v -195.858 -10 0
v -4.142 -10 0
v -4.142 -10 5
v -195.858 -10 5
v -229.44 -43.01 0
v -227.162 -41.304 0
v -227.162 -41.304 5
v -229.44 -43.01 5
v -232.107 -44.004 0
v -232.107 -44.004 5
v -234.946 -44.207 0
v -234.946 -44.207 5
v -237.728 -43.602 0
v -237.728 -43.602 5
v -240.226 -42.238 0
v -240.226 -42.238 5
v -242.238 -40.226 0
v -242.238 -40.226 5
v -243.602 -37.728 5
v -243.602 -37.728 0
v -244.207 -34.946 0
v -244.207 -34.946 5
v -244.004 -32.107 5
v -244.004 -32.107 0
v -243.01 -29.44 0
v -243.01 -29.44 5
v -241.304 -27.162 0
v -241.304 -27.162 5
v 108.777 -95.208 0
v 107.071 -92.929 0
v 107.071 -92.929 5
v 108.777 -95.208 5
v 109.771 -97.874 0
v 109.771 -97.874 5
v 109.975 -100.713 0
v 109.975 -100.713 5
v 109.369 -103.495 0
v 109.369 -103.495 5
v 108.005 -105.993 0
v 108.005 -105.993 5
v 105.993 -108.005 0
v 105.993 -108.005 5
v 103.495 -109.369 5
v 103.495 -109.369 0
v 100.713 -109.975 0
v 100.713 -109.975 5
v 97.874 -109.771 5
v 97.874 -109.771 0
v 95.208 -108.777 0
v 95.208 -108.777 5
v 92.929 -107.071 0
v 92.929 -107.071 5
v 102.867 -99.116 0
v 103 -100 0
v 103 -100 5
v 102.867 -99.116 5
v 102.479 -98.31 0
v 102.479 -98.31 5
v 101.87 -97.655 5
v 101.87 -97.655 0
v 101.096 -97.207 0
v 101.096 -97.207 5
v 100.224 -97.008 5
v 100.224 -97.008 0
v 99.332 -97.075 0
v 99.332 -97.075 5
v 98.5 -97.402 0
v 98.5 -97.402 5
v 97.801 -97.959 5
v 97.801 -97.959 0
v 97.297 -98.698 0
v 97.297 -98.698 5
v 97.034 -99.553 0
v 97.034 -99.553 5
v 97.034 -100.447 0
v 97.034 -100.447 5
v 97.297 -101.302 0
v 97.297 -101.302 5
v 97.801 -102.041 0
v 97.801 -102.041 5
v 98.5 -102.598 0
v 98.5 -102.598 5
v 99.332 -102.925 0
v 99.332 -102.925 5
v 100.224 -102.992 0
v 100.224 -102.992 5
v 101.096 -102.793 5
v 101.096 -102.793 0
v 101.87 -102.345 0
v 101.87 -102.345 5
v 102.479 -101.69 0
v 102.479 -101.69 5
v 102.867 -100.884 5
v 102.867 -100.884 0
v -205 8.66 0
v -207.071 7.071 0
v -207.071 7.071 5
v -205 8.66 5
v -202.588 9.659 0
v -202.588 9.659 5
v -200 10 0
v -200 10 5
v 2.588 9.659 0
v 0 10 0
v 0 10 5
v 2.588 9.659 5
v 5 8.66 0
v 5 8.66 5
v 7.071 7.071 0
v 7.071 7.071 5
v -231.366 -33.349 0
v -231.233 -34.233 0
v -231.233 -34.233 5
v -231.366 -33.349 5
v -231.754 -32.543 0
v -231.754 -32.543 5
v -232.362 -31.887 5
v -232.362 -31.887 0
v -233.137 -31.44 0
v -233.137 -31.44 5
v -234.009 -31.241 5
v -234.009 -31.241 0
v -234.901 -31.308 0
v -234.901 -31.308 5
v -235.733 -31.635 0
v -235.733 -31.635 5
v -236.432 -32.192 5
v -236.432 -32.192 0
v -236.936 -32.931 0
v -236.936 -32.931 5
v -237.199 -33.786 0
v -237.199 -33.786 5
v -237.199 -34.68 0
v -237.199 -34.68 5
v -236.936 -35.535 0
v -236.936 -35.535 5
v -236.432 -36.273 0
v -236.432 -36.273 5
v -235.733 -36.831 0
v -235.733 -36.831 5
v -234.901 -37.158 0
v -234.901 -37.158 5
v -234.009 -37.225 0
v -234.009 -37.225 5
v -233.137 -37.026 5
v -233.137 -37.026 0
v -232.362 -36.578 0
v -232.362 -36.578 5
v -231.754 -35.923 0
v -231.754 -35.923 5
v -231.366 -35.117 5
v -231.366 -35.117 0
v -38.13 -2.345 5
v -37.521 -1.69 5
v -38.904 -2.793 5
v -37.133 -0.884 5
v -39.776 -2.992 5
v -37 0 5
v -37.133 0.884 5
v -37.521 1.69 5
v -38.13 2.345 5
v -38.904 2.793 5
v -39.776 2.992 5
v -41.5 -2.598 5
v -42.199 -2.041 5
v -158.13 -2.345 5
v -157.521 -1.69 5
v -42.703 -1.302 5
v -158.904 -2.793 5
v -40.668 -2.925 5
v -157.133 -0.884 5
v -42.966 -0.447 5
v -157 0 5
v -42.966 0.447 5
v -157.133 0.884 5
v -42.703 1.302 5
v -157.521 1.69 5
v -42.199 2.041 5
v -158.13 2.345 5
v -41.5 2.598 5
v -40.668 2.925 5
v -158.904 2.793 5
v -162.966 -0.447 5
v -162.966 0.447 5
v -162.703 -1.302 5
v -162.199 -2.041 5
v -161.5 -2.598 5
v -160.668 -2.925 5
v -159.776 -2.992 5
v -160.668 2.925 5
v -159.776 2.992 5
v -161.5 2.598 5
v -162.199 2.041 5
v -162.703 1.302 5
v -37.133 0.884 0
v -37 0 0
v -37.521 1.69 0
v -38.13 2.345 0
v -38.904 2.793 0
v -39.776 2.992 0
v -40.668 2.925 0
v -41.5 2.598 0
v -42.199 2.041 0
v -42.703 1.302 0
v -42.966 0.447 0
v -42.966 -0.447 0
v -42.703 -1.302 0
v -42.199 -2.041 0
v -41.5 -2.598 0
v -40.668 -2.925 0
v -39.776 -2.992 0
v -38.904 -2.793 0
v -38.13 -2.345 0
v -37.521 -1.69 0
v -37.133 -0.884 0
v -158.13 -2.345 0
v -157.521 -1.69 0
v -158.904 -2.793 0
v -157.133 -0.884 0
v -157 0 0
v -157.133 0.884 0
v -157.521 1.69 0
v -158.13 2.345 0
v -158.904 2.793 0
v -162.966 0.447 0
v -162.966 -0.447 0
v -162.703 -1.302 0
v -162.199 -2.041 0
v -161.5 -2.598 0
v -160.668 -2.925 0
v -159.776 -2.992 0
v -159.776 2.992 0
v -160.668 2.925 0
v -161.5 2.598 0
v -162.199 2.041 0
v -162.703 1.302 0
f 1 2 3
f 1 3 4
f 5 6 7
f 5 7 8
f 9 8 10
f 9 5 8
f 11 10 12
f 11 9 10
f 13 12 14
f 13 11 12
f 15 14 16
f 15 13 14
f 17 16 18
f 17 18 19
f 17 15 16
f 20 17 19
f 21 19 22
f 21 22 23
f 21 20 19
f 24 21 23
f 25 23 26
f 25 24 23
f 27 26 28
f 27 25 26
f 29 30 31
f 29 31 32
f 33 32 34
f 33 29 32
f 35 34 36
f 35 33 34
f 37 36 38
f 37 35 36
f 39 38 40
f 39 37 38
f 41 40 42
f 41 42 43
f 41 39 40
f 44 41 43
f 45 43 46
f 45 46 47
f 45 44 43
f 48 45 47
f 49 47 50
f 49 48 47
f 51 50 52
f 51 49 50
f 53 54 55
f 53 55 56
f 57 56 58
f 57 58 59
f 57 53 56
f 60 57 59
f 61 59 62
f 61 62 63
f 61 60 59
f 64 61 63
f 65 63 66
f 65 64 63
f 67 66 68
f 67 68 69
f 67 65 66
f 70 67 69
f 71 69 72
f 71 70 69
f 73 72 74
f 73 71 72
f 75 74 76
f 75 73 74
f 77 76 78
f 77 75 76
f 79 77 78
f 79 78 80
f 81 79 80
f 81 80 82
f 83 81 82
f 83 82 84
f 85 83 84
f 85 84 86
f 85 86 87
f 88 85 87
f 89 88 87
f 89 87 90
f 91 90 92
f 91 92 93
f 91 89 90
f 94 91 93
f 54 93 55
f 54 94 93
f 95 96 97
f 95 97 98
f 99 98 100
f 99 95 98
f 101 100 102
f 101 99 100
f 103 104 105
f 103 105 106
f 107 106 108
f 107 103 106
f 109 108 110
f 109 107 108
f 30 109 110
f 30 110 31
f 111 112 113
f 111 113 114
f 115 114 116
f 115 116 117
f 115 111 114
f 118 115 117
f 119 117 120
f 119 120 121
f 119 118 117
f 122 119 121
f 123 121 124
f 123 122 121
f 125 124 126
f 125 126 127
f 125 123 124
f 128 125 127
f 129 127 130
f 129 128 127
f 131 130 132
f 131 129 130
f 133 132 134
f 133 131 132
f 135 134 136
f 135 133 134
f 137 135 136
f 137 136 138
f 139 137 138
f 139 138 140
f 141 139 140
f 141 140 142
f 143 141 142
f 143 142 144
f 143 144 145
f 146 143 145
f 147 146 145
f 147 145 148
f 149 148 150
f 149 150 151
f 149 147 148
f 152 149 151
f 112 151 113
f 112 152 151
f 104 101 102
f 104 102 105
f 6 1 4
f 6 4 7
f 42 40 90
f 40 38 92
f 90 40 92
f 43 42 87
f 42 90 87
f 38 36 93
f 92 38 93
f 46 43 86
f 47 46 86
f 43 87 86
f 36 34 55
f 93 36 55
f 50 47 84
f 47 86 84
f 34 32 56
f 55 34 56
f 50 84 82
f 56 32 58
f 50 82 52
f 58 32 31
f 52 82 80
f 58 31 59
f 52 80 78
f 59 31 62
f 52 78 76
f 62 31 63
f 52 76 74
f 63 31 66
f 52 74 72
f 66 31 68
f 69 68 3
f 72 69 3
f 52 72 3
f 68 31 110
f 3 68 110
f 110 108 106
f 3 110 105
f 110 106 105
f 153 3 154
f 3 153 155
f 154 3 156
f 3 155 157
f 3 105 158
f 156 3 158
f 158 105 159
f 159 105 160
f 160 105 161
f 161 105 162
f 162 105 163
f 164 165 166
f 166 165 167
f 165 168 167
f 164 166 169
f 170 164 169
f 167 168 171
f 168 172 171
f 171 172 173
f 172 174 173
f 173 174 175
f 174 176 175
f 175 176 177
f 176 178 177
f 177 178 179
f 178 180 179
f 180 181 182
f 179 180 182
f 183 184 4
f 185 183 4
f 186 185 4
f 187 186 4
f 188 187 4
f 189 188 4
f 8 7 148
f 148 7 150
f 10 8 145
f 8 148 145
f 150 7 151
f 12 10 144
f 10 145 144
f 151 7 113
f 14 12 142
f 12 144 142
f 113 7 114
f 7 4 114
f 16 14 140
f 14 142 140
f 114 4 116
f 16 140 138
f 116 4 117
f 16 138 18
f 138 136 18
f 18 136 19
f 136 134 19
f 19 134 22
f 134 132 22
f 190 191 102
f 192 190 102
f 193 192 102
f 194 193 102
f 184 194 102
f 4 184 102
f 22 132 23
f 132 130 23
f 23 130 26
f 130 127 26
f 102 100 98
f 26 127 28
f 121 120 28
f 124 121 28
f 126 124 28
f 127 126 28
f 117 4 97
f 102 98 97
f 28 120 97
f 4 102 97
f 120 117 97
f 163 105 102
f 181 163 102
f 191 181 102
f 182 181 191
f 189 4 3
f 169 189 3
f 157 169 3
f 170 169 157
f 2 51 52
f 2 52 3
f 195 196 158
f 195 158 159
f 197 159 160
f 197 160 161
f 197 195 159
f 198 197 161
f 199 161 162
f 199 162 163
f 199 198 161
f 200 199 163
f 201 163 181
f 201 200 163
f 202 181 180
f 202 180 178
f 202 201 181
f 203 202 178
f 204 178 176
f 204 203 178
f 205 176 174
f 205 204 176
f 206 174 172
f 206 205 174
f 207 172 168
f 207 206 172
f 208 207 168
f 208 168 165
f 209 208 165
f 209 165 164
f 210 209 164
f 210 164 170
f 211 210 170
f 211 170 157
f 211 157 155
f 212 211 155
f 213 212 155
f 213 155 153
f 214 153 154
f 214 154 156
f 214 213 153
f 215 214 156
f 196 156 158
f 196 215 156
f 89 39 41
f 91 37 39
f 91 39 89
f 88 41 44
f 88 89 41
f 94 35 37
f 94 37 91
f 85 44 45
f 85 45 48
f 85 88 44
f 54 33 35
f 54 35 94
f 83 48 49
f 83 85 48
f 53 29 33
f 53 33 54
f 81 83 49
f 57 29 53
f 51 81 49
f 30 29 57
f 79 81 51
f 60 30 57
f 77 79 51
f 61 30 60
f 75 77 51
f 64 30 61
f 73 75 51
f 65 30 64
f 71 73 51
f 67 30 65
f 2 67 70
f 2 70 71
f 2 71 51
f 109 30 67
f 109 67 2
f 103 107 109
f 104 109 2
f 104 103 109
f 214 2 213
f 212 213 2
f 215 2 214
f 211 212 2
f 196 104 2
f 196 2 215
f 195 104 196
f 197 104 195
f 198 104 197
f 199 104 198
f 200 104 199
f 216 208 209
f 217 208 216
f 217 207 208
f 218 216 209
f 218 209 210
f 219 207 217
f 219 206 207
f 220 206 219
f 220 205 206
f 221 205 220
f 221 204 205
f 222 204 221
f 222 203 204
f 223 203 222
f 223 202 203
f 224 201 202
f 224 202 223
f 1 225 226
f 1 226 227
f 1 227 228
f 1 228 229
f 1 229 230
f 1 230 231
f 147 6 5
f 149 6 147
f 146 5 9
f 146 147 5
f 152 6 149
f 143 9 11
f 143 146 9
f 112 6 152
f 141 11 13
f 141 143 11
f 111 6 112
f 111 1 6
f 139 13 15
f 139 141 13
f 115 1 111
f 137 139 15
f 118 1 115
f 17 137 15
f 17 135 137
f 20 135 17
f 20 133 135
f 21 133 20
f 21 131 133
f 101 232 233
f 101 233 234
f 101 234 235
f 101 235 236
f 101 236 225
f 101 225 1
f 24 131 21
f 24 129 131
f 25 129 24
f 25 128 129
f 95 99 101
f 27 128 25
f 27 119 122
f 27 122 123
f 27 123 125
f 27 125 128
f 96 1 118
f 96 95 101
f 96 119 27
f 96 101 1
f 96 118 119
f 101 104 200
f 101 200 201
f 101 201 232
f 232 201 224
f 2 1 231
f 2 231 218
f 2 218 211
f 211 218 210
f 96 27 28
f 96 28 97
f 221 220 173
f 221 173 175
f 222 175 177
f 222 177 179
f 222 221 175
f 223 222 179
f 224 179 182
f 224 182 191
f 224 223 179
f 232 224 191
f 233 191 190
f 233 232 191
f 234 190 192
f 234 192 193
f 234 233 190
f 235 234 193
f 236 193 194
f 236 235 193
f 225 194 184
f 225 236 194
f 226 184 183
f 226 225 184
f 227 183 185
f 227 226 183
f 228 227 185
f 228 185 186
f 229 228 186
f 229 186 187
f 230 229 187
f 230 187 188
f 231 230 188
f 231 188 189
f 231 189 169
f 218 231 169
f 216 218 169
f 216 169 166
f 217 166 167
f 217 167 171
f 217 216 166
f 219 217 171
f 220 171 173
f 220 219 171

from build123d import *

# Parameters (mm, degrees)
SKETCH1_R           = 3
BOSS_EXTRUDE2_DEPTH = 5


with BuildPart() as part:
    # Sketch1 → Boss-Extrude2 (new body)
    with BuildSketch(Plane.XY):
        with BuildLine():
            Line((-195.857864376, -10), (-227.161878591, -41.304014214))
            ThreePointArc((-227.161878591, -41.304014214), (-241.304014214, -41.304014214), (-241.304014214, -27.161878591))
            Line((-241.304014214, -27.161878591), (-207.071067812, 7.071067812))
            ThreePointArc((-207.071067812, 7.071067812), (-203.826834324, 9.238795325), (-200, 10))
            Line((-200, 10), (0, 10))
            ThreePointArc((0, 10), (3.826834324, 9.238795325), (7.071067812, 7.071067812))
            Line((7.071067812, 7.071067812), (107.071067812, -92.928932188))
            ThreePointArc((107.071067812, -92.928932188), (107.071067812, -107.071067812), (92.928932188, -107.071067812))
            Line((92.928932188, -107.071067812), (-4.142135624, -10))
            Line((-4.142135624, -10), (-195.857864376, -10))
        make_face()
        with Locations((-234.232946402, -34.232946402)):
            Circle(SKETCH1_R, mode=Mode.SUBTRACT)
        with Locations((100, -100)):
            Circle(SKETCH1_R, mode=Mode.SUBTRACT)
        with Locations((-160, 0)):
            Circle(SKETCH1_R, mode=Mode.SUBTRACT)
        with Locations((-40, 0)):
            Circle(SKETCH1_R, mode=Mode.SUBTRACT)
    extrude(amount=BOSS_EXTRUDE2_DEPTH)


solid = part.part
